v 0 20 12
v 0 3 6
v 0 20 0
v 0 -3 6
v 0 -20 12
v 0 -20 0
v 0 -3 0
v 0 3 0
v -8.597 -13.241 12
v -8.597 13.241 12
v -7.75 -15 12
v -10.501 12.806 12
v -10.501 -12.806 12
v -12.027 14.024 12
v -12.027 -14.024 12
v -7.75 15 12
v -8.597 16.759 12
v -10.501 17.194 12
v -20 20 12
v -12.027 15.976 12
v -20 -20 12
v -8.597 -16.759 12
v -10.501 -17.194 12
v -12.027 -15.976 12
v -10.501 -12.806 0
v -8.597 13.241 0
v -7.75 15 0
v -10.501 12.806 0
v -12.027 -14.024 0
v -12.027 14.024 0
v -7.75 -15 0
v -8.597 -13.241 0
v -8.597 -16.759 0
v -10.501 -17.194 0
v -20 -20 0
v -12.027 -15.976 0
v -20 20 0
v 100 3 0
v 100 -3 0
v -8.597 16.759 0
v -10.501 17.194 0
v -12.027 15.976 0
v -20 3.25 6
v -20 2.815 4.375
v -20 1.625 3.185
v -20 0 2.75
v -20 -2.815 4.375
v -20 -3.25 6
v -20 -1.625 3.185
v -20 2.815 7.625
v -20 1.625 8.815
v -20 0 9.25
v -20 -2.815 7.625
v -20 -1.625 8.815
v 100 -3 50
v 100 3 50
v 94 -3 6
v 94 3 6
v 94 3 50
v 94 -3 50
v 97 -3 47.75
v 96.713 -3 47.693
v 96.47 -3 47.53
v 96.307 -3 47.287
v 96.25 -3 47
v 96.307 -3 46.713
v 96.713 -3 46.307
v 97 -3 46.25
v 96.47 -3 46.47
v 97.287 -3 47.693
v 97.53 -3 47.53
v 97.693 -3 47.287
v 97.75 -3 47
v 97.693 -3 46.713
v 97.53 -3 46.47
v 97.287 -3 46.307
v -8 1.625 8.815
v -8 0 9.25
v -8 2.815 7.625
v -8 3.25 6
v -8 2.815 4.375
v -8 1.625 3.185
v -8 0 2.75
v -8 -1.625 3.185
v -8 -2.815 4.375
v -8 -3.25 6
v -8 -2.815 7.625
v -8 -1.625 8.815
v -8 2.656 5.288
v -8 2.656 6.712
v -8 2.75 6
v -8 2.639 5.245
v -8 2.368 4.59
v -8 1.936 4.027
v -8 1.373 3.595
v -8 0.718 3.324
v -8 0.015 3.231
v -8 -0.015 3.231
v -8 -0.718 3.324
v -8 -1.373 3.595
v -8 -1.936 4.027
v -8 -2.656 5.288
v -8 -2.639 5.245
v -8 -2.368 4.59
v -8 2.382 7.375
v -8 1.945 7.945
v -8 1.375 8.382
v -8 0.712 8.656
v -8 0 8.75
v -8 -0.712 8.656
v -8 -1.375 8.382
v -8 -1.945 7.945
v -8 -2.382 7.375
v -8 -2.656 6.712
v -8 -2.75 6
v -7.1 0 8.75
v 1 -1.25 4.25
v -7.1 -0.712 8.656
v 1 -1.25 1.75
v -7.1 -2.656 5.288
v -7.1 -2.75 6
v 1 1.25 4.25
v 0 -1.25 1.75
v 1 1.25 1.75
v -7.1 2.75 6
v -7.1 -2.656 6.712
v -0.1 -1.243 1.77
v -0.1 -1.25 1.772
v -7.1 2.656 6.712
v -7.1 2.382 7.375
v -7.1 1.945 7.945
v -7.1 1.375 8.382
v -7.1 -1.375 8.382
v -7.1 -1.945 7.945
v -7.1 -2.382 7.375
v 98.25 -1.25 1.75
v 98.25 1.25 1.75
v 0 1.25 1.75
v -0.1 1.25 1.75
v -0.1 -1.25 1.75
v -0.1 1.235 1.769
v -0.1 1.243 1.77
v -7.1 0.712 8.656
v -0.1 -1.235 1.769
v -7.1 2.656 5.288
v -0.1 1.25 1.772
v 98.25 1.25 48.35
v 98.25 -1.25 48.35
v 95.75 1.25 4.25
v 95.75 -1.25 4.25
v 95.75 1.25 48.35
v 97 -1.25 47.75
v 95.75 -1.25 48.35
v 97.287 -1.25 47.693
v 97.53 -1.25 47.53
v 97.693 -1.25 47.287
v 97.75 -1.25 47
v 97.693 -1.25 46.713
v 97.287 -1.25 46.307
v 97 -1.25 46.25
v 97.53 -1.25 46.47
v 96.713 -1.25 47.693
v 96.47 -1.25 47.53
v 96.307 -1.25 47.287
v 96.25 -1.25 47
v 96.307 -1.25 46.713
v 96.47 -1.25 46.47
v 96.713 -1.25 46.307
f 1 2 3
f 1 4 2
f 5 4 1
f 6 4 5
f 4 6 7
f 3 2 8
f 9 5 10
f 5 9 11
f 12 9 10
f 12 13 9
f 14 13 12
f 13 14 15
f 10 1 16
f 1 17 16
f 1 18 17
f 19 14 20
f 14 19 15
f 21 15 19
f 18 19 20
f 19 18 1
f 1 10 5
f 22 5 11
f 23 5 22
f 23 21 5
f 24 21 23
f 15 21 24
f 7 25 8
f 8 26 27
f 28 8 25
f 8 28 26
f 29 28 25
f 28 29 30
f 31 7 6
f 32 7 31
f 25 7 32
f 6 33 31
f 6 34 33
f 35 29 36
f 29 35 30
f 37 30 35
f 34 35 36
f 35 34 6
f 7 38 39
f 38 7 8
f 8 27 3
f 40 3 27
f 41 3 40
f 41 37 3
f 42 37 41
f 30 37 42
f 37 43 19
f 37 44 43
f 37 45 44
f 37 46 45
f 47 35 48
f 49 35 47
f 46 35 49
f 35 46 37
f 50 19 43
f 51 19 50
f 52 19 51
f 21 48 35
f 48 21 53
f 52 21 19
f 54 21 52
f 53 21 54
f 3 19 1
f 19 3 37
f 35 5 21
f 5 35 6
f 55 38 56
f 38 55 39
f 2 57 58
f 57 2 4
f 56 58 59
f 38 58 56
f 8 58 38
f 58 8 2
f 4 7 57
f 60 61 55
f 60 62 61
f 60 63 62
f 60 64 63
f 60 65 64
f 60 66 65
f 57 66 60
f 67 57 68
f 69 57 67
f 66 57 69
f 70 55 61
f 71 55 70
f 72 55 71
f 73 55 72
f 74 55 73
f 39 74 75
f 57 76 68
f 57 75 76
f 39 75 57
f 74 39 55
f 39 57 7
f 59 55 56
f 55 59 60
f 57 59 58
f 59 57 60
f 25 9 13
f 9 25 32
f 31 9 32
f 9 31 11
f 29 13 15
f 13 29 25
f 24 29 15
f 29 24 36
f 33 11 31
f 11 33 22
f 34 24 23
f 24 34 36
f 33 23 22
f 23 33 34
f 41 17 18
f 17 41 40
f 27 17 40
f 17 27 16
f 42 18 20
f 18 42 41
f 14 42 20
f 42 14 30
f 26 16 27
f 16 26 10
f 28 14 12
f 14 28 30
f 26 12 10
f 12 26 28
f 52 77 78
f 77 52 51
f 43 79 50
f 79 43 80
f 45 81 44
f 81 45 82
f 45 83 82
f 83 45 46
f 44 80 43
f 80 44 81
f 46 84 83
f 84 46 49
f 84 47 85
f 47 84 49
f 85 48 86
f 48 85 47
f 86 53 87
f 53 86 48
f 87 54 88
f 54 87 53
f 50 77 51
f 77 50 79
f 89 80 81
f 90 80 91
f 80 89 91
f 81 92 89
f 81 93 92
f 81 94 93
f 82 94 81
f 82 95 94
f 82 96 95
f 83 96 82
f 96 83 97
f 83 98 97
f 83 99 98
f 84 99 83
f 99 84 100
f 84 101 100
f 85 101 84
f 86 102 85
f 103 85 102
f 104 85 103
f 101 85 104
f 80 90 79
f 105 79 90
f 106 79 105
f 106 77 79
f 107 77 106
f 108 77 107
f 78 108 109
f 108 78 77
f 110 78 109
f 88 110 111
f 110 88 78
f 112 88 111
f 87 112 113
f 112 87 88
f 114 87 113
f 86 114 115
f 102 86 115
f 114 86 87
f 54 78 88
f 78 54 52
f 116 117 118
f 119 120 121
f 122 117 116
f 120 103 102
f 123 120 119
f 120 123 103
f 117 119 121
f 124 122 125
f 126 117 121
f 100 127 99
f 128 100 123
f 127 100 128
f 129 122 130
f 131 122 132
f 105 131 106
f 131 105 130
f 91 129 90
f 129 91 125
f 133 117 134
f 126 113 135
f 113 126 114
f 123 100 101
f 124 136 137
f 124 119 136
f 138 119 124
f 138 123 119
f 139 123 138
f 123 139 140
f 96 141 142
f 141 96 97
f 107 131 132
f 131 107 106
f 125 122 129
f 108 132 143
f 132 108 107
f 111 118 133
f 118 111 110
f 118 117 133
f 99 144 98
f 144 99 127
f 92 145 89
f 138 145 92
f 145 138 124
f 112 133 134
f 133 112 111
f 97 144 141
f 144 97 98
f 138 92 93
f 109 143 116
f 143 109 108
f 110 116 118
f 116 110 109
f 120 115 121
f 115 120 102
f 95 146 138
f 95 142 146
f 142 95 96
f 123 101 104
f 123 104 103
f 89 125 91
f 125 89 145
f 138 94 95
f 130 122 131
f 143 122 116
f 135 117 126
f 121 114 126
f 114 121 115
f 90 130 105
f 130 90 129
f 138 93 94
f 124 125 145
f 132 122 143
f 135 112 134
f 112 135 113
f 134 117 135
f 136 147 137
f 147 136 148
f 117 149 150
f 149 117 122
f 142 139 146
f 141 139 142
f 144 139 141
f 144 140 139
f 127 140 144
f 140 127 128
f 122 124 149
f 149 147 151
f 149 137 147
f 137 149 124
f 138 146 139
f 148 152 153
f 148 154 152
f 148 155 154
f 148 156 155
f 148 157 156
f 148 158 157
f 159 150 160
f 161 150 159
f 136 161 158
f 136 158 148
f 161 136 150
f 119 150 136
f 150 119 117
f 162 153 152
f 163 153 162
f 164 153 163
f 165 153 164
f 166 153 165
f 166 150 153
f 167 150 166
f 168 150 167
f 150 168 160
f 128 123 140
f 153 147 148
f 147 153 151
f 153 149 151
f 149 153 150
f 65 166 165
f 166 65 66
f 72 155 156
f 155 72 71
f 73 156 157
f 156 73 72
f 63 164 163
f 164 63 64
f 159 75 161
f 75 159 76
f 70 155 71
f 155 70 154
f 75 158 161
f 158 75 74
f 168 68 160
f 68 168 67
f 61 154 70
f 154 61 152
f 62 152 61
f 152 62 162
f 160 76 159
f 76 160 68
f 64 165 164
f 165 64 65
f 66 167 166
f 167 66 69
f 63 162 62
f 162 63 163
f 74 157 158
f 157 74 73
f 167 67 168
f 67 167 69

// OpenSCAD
base_thickness = 12;
base_width = 20;
base_height = 40;

probe_width = 6;
probe_l1 = 100;
probe_l2 = 50;

probe_inner_width = 2.5;

difference() {
  // Main body
  union() {
    translate([-base_width, -base_height / 2, 0]) {
      cube([base_width, base_height, base_thickness]);
    }
    translate([0, -probe_width / 2, 0]) {
      cube([probe_l1, probe_width, probe_width]);
    }
    translate([probe_l1 - probe_width, -probe_width / 2, 0]) {
      cube([probe_width, probe_width, probe_l2]);
    }
  }

  // Pipe hole
  translate([-8, 0, base_thickness / 2]) {
    rotate([0, -90, 0]) {
      cylinder(d = 6.5, h = 20, $fn = 12);
    }
  }

  // Base airflow path
  hull() {
    translate([0, 0, probe_width / 2]) {
      rotate([0, 90, 0]) {
        linear_extrude(1) {
          square([probe_inner_width, probe_inner_width], center = true);
        }
      }
    }
    translate([-8.1, 0, base_thickness / 2]) {
      rotate([0, 90, 0]) {
        linear_extrude(1) {
          circle(d = 5.5, $fn = 24);
        }
      }
    }
  }

  // Probe airflow path
  translate([-0.1, -probe_inner_width / 2, (probe_width - probe_inner_width) / 2]) {
    cube([probe_l1 + 0.1 - (probe_width - probe_inner_width) / 2, probe_inner_width, probe_inner_width]);
  }
  translate([probe_l1 - (probe_width / 2) - (probe_inner_width / 2), -probe_inner_width / 2, (probe_width - probe_inner_width) / 2]) {
    cube([probe_inner_width, probe_inner_width, probe_l2 + 0.1 - (probe_width - probe_inner_width)]);
  }

  // Metering metering hole
  translate([probe_l1 - (probe_width / 2), 0, probe_l2 - (probe_width / 2)]) {
    rotate([90, 0, 0]) {
      cylinder(d = 1.5, h = (probe_width / 2) + 0.1, $fn = 16);
    }
  }

  // Mounting holes (for M3 brass inserts)
  for(y = [-15, 15]) {
    translate([-base_width / 2, y, -0.1]) {
      cylinder(d = 4.5, h = base_height + 0.2, $fn = 7);
    }
  }

  // translate([-50, 0, -1]) cube([150, 50, 80]);
}
